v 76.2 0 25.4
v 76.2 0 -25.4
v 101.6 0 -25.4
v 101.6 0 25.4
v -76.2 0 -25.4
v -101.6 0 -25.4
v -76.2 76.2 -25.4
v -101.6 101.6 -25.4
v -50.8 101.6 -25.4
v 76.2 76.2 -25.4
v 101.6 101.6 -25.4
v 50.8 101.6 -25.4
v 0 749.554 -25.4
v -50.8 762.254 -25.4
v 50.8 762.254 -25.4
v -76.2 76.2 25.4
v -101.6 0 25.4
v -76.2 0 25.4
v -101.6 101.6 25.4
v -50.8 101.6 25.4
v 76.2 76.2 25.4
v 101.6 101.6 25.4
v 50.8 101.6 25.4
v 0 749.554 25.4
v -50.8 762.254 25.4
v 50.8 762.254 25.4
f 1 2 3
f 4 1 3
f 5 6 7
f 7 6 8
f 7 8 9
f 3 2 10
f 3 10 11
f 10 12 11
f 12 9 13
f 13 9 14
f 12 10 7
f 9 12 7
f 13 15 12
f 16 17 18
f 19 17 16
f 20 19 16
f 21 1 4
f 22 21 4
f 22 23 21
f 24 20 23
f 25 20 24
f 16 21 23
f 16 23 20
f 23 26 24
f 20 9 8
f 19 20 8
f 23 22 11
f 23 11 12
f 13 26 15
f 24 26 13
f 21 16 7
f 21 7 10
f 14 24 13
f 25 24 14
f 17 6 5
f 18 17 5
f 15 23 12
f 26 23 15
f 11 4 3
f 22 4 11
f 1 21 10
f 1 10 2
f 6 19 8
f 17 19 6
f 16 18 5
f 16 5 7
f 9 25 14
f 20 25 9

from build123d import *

# Parameters (mm, degrees)
BOSS_EXTRUDE1_DEPTH = 25.4


with BuildPart() as part:
    # Sketch1 → Boss-Extrude1 (new body, symmetric)
    with BuildSketch(Plane.XY):
        Polygon((0, 749.554), (-50.8, 762.254), (-50.8, 101.6), (-101.6, 101.6), (-101.6, 0), (-76.2, 0), (-76.2, 76.2), (0, 76.2), (76.2, 76.2), (76.2, 0), (101.6, 0), (101.6, 101.6), (50.8, 101.6), (50.8, 762.254), align=None)
    extrude(amount=BOSS_EXTRUDE1_DEPTH, both=True)


solid = part.part
